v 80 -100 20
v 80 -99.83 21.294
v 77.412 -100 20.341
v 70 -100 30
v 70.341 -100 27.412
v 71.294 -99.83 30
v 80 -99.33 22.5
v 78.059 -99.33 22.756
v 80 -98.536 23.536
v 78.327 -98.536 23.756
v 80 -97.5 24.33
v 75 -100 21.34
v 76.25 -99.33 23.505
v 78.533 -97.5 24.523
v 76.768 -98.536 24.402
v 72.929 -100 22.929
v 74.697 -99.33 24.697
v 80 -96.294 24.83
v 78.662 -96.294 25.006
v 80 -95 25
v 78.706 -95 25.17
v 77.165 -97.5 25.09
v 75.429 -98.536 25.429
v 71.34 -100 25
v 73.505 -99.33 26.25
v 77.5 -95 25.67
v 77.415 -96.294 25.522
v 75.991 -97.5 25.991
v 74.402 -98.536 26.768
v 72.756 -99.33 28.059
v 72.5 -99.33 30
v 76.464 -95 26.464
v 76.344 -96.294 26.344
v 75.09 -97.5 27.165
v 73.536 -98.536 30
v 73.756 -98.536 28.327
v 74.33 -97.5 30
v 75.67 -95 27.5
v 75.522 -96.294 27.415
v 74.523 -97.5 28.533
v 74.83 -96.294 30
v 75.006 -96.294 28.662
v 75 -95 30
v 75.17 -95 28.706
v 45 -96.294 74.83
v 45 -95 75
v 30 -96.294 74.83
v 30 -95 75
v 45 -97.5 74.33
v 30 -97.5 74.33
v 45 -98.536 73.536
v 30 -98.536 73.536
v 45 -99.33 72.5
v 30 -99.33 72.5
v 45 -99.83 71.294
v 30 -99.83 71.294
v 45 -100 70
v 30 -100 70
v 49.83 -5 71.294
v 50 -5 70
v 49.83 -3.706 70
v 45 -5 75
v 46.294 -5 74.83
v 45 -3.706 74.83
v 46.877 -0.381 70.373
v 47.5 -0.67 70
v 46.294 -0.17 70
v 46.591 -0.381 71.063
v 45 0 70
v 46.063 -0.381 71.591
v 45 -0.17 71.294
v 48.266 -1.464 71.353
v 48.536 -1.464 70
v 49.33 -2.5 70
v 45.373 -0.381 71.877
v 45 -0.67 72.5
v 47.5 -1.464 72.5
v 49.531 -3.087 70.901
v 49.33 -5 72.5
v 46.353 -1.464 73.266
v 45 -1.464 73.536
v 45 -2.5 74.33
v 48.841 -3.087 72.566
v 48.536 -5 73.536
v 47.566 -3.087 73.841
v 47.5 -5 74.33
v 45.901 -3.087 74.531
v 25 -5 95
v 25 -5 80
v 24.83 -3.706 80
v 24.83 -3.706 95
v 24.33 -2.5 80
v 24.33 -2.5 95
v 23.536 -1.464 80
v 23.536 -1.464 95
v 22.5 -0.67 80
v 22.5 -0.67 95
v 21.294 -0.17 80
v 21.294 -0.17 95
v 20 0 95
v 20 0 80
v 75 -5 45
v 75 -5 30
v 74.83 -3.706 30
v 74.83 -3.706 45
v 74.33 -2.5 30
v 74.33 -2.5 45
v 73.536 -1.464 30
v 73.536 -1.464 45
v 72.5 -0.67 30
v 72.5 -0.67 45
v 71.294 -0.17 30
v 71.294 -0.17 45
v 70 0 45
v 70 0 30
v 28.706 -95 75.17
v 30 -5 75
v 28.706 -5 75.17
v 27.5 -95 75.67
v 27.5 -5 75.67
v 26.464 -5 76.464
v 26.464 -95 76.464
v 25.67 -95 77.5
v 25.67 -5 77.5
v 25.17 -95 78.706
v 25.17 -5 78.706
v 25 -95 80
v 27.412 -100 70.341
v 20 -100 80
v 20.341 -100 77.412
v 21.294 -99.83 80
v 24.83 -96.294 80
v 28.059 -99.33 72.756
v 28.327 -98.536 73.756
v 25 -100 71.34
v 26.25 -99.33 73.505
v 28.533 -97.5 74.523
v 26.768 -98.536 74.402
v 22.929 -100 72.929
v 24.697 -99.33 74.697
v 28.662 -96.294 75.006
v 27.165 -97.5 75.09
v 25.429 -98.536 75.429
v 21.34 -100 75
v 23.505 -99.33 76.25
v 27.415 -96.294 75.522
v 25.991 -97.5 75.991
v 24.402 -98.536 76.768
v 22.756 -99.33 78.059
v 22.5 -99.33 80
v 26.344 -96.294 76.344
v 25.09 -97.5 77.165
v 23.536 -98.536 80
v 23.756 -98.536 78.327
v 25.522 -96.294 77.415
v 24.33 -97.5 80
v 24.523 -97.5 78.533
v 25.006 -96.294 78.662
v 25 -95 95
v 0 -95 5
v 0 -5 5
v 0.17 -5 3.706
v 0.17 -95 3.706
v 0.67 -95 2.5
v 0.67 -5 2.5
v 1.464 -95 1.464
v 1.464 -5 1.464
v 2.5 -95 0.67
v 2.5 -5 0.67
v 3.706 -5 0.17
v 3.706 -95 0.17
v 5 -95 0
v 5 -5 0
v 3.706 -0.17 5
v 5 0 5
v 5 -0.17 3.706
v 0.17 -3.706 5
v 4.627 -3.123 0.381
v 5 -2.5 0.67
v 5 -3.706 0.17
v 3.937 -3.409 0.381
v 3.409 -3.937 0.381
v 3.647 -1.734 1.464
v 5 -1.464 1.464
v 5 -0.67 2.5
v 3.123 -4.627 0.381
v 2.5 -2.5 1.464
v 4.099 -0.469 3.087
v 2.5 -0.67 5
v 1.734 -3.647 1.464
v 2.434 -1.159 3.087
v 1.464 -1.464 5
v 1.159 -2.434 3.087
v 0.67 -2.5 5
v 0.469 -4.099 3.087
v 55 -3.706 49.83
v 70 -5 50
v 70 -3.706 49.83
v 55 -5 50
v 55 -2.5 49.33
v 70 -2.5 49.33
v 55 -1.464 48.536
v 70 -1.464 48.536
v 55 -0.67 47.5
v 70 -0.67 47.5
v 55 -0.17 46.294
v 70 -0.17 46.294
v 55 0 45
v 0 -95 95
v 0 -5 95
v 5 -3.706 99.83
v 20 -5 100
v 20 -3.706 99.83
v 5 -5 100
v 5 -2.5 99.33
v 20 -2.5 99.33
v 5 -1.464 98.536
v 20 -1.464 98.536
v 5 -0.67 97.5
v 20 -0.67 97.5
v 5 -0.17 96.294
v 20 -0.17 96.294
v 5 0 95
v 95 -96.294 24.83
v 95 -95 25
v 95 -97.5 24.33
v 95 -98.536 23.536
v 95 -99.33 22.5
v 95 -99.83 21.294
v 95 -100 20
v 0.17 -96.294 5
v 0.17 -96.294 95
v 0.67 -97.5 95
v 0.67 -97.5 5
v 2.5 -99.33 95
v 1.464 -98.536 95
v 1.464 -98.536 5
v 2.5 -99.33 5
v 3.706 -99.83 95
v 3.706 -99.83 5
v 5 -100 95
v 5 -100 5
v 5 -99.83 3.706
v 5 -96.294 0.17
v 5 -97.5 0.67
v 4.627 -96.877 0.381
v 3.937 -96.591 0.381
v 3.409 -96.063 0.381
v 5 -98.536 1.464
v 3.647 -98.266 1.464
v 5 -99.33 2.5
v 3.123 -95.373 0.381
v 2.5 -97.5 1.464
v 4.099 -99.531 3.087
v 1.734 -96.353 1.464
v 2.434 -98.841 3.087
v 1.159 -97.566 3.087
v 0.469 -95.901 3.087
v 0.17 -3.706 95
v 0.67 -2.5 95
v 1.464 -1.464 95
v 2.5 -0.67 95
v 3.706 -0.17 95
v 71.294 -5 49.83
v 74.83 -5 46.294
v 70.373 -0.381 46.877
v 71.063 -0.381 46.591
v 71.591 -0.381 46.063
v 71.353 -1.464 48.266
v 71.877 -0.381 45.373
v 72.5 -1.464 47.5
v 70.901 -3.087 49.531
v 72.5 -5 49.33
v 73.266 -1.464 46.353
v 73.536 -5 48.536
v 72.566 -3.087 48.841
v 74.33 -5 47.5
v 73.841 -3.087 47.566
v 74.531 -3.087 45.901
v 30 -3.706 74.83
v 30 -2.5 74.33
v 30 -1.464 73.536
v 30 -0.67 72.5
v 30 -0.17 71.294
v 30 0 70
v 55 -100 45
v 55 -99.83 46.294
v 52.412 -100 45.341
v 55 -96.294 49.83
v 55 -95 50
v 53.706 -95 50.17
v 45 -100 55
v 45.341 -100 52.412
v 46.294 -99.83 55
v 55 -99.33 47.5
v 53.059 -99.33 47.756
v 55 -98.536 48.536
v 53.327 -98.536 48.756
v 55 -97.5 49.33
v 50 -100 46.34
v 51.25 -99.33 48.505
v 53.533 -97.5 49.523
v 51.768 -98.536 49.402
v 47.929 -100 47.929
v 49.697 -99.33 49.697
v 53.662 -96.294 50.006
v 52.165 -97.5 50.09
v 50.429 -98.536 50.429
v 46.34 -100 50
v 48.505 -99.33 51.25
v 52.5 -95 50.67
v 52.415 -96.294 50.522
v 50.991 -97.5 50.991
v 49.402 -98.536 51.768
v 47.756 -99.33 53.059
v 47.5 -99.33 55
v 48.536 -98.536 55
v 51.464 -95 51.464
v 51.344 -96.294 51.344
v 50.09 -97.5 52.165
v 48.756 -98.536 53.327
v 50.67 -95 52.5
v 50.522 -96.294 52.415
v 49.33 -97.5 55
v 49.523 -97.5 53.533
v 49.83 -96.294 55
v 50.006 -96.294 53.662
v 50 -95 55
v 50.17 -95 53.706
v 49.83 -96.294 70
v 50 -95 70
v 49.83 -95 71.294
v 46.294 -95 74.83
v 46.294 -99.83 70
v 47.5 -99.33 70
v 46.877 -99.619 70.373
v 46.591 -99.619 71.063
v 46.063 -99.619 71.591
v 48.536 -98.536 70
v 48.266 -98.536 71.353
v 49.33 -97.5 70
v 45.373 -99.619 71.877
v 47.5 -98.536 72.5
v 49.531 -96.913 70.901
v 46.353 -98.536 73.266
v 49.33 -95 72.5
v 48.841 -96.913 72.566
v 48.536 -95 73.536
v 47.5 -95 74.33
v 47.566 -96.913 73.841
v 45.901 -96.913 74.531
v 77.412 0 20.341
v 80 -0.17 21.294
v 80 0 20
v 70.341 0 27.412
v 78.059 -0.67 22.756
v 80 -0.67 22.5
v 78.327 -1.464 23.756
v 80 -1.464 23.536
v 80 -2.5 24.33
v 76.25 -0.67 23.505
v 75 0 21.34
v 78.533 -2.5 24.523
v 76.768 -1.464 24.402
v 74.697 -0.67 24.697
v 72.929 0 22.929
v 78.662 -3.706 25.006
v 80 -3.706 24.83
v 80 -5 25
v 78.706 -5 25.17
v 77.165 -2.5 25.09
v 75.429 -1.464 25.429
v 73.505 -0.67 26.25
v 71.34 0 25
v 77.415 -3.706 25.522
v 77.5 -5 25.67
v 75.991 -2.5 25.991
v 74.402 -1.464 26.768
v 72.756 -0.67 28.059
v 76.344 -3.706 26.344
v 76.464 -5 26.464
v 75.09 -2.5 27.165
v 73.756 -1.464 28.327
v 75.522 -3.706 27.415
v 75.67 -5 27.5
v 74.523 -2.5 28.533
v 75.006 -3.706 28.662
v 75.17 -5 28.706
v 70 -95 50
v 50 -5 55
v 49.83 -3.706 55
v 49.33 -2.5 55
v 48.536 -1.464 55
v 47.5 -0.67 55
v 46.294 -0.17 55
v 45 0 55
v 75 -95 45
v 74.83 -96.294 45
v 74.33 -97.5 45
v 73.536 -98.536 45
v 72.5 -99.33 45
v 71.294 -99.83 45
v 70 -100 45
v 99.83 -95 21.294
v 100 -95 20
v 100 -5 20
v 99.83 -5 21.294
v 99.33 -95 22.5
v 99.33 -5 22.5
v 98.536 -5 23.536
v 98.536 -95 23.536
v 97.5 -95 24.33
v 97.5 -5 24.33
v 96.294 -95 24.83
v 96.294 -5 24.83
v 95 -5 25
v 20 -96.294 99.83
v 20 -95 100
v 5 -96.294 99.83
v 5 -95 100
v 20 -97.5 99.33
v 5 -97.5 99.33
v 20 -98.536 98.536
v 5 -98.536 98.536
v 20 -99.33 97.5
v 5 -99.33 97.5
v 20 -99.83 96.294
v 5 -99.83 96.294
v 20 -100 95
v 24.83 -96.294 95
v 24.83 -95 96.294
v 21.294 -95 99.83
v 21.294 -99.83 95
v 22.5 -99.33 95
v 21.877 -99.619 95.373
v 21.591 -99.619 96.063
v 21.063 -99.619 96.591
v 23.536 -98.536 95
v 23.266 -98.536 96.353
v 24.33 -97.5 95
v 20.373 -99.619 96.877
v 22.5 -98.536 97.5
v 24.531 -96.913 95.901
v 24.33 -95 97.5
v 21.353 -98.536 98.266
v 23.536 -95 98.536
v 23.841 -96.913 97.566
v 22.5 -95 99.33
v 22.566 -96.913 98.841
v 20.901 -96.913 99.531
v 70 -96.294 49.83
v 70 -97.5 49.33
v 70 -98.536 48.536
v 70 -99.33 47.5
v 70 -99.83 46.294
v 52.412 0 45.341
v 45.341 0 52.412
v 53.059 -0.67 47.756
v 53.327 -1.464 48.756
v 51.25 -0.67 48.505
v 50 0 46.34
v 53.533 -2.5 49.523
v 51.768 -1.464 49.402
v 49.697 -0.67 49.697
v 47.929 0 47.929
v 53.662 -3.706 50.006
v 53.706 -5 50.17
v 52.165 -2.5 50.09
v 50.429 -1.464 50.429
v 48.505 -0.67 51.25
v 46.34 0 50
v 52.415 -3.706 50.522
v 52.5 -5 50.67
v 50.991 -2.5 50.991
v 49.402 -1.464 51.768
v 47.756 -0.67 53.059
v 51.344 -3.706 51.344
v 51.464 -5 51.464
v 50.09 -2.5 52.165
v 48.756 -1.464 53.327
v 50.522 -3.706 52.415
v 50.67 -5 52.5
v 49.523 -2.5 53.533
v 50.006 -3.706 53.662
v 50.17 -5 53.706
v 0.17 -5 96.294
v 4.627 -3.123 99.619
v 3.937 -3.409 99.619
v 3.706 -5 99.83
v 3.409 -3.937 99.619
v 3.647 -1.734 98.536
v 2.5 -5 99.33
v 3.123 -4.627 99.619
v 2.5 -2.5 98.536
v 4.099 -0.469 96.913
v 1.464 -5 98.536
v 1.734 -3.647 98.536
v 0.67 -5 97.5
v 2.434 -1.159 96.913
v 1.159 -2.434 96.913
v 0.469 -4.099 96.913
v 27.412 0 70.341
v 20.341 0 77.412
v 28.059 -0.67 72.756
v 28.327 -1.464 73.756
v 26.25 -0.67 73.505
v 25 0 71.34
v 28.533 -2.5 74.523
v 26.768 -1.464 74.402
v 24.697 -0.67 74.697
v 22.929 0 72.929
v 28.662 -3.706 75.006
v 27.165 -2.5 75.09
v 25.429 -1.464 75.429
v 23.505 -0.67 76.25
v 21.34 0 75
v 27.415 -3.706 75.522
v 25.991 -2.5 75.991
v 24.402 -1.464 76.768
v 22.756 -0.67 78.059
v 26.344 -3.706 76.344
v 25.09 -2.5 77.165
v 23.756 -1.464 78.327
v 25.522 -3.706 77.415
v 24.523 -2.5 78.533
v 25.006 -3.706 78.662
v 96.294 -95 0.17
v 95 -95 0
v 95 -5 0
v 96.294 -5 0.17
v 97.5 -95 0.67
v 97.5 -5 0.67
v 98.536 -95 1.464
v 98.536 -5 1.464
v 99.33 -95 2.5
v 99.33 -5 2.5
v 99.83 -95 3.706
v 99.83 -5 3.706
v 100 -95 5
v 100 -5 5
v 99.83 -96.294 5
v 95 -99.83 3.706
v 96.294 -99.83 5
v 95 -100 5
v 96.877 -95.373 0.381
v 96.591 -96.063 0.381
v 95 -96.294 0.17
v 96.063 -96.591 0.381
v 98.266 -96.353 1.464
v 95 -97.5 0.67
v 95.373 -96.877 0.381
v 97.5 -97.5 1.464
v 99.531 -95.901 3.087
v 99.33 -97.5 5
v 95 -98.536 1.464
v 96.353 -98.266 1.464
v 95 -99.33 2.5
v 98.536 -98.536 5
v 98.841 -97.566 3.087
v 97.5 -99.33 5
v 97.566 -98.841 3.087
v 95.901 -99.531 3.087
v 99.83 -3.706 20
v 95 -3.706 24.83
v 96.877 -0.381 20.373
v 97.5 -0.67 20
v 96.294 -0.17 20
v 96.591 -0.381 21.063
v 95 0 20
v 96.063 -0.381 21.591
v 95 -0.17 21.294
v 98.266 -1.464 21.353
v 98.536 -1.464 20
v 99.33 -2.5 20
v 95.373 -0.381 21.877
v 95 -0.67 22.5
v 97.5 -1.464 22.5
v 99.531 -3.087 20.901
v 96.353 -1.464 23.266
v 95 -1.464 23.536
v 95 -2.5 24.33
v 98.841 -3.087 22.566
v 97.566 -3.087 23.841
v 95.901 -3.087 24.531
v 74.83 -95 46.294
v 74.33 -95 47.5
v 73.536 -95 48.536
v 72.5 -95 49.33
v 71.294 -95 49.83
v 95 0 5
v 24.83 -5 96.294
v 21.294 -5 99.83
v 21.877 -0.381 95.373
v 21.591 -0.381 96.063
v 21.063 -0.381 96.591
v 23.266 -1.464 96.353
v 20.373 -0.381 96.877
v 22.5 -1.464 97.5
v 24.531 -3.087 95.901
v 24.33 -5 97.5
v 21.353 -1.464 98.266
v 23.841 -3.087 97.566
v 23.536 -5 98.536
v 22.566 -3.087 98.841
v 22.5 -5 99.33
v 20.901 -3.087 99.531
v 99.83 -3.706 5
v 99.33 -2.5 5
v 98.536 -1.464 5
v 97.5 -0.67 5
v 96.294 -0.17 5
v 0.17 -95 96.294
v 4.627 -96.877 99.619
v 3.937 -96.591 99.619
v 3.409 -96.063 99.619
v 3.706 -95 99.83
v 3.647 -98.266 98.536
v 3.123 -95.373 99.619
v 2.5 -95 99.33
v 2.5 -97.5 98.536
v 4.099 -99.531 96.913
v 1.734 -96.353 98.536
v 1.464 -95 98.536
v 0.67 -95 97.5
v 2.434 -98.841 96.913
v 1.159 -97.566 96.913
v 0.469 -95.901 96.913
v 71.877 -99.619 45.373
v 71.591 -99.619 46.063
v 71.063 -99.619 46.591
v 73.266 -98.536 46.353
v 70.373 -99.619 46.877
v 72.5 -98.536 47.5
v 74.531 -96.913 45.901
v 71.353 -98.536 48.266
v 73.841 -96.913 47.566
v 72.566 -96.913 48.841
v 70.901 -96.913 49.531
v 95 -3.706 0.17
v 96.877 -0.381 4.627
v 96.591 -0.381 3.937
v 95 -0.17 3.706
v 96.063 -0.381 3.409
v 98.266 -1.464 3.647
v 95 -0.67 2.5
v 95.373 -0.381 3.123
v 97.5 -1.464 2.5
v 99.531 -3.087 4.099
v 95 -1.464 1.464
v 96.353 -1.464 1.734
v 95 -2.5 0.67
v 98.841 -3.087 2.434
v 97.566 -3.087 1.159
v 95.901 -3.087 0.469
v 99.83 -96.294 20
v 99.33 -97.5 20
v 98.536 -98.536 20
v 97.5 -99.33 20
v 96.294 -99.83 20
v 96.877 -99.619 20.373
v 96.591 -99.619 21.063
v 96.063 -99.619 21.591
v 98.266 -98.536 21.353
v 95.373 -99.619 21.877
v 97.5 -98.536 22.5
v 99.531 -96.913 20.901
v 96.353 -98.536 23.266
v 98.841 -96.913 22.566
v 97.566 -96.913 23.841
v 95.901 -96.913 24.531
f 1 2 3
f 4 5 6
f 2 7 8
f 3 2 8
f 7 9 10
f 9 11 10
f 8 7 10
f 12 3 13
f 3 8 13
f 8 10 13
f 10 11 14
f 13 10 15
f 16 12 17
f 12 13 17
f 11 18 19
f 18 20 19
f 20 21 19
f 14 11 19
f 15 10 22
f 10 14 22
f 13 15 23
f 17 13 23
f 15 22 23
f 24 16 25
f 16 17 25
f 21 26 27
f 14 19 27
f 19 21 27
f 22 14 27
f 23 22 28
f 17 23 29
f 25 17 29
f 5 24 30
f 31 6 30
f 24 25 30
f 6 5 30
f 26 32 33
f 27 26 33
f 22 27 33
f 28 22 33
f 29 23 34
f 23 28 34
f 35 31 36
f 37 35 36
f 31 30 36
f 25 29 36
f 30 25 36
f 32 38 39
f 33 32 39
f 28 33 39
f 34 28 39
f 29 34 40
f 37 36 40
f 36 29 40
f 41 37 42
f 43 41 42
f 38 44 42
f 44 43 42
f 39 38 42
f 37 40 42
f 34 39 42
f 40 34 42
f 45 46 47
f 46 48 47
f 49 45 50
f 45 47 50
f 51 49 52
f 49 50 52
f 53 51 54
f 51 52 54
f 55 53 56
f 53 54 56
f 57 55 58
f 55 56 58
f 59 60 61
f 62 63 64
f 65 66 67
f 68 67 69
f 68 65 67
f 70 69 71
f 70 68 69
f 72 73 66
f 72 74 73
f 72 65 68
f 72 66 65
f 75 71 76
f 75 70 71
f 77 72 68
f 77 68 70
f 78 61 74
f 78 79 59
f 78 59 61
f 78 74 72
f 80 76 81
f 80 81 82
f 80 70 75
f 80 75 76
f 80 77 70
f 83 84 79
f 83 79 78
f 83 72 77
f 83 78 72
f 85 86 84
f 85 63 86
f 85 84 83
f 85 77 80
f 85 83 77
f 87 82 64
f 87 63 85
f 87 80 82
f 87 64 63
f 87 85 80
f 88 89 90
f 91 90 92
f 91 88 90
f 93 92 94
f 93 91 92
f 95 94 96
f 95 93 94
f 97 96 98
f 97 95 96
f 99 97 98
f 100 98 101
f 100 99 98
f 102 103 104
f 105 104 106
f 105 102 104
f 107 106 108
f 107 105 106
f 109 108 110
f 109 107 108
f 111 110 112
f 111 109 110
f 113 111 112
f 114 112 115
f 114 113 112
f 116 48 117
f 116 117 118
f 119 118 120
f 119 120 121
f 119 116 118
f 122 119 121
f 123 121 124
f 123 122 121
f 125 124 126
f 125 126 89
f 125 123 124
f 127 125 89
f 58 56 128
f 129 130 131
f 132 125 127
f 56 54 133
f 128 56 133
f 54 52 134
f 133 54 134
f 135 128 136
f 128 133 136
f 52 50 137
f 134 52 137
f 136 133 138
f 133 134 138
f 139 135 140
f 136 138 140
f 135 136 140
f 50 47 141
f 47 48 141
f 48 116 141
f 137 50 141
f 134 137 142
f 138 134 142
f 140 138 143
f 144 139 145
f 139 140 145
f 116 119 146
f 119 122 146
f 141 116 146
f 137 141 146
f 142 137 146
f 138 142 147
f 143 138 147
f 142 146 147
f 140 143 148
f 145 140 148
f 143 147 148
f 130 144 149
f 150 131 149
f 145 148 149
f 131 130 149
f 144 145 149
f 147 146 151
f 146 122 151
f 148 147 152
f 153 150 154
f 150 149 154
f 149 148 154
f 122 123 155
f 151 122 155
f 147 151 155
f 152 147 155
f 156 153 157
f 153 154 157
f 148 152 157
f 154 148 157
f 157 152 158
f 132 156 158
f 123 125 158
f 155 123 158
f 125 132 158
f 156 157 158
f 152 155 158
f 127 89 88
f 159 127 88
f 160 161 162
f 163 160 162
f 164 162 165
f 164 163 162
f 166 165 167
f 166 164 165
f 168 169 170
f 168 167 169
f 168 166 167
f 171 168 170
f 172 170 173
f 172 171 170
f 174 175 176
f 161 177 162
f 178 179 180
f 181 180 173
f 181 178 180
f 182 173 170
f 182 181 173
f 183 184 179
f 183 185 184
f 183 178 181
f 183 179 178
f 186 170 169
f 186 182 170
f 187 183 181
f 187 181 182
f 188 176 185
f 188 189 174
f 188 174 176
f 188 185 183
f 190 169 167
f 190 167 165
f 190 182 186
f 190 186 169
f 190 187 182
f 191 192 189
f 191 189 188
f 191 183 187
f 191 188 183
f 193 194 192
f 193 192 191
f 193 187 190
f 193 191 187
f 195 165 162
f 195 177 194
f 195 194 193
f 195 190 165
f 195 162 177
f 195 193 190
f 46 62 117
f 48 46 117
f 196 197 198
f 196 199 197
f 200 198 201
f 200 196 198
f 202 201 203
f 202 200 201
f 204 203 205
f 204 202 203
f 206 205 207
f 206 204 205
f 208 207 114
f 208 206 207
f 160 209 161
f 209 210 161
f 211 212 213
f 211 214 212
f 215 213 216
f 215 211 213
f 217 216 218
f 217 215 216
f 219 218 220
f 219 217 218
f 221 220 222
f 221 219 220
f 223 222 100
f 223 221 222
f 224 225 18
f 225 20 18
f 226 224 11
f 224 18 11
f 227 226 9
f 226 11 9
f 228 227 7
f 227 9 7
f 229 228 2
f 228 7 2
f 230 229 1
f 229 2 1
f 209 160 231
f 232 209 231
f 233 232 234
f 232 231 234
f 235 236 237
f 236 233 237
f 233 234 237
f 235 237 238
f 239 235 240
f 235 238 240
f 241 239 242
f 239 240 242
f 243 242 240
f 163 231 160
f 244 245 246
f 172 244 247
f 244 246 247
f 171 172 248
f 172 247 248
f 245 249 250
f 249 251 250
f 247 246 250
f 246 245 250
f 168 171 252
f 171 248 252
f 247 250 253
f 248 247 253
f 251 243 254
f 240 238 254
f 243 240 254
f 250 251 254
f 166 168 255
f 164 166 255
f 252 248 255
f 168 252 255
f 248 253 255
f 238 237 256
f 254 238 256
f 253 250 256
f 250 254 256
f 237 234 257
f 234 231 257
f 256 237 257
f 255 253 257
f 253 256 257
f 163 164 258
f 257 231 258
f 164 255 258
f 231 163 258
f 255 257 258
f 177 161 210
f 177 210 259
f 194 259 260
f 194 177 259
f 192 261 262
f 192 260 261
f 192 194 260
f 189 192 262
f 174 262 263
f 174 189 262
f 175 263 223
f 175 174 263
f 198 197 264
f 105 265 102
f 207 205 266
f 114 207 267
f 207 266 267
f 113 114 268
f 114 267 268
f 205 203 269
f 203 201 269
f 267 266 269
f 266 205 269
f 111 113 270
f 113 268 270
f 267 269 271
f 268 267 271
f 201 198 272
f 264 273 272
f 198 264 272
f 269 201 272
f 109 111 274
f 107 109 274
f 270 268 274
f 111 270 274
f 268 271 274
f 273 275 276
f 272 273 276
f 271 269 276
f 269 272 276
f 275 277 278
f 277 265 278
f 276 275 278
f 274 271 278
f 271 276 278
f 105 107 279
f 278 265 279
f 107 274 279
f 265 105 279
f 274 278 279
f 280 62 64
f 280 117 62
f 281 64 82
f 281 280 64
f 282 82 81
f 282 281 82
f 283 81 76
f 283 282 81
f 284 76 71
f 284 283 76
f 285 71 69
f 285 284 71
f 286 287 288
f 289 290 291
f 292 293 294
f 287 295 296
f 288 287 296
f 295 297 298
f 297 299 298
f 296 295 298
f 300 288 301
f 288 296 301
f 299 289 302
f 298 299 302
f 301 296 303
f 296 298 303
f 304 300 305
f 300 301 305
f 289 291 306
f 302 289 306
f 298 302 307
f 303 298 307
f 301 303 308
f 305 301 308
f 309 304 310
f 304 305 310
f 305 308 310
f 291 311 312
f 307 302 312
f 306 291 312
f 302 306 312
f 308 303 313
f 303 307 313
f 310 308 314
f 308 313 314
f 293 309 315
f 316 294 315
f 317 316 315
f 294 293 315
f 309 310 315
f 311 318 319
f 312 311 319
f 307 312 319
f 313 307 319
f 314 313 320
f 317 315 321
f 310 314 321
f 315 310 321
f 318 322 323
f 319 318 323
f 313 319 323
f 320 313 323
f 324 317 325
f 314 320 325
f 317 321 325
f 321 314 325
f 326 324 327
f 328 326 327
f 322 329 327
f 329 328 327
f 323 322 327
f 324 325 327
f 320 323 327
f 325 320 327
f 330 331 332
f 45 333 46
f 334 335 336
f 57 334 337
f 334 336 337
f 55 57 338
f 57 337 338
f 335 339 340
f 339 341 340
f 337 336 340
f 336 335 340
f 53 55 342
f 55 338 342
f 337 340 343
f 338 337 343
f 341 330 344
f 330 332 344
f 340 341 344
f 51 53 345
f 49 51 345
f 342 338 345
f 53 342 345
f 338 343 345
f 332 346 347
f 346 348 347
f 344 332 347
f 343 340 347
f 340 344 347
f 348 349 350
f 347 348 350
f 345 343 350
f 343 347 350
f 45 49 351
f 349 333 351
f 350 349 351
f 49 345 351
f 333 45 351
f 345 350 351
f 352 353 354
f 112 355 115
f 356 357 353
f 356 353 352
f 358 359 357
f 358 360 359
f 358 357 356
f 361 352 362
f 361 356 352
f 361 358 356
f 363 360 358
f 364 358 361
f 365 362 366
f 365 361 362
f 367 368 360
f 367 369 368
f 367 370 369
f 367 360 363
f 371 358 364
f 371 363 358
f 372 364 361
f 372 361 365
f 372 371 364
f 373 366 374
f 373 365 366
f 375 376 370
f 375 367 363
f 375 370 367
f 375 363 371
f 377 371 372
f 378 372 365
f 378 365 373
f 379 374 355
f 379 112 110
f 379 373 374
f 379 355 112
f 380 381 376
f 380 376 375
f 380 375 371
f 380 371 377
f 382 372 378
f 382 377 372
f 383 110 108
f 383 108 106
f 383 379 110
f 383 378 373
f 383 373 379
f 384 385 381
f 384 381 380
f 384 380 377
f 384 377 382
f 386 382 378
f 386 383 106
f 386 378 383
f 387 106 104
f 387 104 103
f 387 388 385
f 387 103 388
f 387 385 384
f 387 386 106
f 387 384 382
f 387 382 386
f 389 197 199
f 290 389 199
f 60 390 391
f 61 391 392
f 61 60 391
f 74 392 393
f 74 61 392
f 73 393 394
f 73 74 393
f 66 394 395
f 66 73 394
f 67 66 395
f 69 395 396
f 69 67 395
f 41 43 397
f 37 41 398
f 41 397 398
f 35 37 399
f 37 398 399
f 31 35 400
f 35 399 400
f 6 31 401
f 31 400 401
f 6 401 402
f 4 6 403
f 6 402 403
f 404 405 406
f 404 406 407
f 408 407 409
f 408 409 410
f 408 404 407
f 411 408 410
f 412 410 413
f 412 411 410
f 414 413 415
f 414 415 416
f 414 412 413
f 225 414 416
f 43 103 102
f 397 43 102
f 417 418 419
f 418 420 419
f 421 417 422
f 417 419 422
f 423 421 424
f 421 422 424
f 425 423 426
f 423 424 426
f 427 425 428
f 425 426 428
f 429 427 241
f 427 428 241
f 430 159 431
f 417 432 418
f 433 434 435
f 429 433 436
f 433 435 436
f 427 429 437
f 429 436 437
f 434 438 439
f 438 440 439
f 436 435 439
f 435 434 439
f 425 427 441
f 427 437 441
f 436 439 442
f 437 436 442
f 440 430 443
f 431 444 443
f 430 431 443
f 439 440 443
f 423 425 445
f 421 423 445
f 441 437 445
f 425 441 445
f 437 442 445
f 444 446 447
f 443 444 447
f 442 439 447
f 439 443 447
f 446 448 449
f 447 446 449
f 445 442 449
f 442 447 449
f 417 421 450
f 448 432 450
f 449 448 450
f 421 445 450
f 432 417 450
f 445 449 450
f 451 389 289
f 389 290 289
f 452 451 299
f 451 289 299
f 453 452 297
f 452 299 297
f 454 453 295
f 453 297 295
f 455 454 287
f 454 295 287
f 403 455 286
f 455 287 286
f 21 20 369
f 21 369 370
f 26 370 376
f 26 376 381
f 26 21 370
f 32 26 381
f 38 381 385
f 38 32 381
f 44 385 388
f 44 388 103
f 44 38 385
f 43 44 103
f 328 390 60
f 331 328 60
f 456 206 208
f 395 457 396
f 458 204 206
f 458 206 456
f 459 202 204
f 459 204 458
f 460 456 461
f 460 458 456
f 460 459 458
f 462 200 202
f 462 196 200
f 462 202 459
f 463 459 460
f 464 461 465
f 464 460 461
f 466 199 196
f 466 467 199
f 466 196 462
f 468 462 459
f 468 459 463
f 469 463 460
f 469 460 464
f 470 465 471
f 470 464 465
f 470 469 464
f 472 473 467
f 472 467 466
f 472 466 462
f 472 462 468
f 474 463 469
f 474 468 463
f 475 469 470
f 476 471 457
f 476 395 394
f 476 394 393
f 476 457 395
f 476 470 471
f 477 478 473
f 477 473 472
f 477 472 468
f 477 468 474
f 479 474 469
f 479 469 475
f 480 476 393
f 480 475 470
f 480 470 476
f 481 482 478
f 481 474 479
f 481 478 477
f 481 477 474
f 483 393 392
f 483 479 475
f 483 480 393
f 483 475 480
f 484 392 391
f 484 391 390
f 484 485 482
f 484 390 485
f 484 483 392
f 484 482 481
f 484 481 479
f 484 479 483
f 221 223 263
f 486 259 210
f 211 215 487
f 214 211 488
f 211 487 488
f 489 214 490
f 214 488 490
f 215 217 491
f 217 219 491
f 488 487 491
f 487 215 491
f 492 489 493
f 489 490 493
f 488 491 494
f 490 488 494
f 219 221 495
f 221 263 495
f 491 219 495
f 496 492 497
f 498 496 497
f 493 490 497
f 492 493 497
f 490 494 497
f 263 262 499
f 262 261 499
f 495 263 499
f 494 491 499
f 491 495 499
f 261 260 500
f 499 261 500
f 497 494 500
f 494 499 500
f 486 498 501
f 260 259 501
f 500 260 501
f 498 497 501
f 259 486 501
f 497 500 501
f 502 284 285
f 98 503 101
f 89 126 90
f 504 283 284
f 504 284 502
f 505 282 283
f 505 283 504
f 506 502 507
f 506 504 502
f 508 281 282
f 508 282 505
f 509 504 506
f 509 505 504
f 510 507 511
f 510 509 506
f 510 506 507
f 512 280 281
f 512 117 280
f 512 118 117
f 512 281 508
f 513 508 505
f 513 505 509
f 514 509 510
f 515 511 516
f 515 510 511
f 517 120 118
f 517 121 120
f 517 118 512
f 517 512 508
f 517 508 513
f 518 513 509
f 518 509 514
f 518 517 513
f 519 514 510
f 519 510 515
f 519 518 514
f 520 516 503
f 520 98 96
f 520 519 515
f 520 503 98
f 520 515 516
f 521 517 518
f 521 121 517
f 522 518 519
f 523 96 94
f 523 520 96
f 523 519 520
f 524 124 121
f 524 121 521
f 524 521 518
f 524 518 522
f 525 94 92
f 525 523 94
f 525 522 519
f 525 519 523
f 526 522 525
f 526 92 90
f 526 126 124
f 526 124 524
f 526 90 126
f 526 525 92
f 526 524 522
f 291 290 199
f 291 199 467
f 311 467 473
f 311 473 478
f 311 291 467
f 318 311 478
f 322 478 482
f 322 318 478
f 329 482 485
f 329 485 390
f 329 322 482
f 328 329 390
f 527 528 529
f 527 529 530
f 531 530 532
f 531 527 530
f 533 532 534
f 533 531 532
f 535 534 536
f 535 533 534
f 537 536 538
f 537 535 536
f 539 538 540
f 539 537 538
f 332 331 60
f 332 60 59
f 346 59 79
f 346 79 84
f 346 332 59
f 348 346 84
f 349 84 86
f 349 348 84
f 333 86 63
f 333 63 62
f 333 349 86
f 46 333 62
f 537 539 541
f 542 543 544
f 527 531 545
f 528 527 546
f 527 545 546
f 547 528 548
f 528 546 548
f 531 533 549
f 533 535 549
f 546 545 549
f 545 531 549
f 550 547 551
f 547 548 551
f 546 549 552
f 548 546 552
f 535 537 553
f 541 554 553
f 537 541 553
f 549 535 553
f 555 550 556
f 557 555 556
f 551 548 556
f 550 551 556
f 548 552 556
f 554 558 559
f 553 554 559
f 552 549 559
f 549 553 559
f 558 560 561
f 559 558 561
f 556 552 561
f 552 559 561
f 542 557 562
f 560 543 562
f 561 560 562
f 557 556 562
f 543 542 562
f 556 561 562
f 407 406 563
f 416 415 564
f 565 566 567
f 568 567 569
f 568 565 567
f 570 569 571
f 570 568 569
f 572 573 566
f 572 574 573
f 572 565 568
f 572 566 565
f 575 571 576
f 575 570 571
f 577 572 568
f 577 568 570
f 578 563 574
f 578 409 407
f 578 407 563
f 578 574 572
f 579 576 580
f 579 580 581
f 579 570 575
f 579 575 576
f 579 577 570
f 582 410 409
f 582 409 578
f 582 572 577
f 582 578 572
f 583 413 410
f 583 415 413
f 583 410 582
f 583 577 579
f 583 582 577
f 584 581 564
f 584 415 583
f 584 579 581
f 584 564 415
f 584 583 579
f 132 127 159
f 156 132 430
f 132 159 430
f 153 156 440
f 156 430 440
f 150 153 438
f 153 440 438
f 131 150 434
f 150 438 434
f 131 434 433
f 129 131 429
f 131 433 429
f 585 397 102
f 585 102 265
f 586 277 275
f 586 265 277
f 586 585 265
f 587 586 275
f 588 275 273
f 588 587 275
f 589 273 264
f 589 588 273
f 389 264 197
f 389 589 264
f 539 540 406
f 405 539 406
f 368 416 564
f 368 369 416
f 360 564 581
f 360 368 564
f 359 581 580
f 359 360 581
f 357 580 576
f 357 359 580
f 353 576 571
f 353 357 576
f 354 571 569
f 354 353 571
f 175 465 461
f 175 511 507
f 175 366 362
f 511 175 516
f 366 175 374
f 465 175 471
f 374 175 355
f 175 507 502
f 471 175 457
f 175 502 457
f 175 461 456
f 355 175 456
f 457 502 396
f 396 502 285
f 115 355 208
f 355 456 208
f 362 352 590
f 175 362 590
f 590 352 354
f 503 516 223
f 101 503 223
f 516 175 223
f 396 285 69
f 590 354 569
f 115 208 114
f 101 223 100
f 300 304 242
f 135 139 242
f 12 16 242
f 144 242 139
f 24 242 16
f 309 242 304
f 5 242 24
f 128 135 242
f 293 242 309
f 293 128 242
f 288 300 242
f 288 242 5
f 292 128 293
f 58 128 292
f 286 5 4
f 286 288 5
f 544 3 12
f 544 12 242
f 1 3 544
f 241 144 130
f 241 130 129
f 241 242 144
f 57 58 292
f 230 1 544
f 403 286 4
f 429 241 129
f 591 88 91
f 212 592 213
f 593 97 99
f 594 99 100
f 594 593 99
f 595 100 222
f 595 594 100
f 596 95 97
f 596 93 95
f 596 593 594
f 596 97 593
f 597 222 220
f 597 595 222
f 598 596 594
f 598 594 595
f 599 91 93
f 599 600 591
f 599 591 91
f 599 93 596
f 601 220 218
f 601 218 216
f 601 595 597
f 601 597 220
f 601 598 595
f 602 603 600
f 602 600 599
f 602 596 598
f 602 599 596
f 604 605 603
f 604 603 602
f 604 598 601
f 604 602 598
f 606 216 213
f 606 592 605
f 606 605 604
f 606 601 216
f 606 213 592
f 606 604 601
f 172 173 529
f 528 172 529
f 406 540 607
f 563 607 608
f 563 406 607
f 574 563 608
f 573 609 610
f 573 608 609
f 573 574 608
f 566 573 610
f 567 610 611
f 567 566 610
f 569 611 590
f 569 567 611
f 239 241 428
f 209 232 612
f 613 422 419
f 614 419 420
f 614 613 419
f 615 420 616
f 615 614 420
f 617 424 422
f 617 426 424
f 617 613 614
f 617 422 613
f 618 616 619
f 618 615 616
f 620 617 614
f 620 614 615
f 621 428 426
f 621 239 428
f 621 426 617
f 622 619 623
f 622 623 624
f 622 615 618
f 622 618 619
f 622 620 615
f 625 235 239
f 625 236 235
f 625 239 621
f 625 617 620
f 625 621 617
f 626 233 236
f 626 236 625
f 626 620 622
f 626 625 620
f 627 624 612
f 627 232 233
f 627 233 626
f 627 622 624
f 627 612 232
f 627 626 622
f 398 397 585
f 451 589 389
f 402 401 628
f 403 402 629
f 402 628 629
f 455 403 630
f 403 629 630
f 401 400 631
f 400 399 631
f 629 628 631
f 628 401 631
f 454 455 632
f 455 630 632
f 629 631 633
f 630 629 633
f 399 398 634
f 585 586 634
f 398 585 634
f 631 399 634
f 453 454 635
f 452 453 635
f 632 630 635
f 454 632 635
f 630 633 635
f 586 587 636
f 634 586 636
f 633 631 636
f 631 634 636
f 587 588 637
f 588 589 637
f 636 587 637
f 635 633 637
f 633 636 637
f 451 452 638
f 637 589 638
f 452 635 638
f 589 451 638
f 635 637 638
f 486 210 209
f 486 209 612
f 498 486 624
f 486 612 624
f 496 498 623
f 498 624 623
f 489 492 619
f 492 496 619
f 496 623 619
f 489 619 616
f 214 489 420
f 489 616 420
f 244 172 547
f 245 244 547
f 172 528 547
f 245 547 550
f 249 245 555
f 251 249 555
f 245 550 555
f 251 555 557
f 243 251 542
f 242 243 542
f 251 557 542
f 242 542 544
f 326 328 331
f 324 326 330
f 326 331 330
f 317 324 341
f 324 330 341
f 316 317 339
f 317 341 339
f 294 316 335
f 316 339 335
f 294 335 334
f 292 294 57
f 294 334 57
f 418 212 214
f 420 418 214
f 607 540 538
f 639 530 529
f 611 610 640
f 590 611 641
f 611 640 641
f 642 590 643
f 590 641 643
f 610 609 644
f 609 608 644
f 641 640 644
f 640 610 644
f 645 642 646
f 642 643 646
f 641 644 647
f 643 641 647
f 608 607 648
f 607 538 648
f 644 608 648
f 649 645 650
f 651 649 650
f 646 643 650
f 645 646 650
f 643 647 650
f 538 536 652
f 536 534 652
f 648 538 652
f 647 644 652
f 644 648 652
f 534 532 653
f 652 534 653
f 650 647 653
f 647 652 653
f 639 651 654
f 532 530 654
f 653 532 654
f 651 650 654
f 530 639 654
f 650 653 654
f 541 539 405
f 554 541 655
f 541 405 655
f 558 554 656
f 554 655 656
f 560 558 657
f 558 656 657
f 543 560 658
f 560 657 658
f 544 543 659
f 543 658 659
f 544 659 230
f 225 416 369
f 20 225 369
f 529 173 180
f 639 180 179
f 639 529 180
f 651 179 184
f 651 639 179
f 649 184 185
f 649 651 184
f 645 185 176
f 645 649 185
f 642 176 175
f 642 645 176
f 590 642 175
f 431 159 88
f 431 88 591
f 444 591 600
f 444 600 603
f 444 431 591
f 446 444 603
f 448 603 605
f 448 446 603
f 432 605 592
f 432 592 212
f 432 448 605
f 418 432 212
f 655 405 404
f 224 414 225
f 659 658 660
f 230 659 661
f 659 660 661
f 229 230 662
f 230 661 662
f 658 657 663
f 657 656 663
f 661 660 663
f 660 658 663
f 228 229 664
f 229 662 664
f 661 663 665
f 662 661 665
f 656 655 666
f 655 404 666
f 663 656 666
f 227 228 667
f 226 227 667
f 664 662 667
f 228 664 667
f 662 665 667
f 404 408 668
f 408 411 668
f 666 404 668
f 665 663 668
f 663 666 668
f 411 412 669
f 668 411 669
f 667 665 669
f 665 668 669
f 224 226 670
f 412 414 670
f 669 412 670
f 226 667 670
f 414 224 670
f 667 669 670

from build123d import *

# Parameters (mm, degrees)
F1_DEPTH = 100
F2_R     = 5


with BuildPart() as f1:
    # F0 (on Front) → F1 (new body)
    with BuildSketch(Plane.XZ):
        Polygon((0, 100), (0, 0), (100, 0), (100, 25), (75, 25), (75, 50), (50, 50), (50, 75), (25, 75), (25, 100), align=None)
    extrude(amount=F1_DEPTH)

    # F2
    f2_edges = [f1.edges().sort_by_distance(p)[0] for p in [
        (25, -50, 100),
        (25, -50, 75),
        (50, -50, 75),
        (50, -50, 50),
        (75, -50, 50),
        (75, -50, 25),
        (100, -50, 25),
        (100, -100, 12.5),
        (100, -50, 0),
        (100, 0, 12.5),
        (87.5, -100, 25),
        (75, -100, 37.5),
        (62.5, 0, 50),
        (62.5, -100, 50),
        (0, -100, 50),
        (50, -100, 0),
        (50, -100, 62.5),
        (37.5, -100, 75),
        (25, -100, 87.5),
        (12.5, -100, 100),
        (0, 0, 50),
        (50, 0, 0),
        (87.5, 0, 25),
        (75, 0, 37.5),
        (50, 0, 62.5),
        (37.5, 0, 75),
        (25, 0, 87.5),
        (12.5, 0, 100),
        (0, -50, 100),
        (0, -50, 0),
    ]]
    fillet(f2_edges, radius=F2_R)


solid = f1.part
